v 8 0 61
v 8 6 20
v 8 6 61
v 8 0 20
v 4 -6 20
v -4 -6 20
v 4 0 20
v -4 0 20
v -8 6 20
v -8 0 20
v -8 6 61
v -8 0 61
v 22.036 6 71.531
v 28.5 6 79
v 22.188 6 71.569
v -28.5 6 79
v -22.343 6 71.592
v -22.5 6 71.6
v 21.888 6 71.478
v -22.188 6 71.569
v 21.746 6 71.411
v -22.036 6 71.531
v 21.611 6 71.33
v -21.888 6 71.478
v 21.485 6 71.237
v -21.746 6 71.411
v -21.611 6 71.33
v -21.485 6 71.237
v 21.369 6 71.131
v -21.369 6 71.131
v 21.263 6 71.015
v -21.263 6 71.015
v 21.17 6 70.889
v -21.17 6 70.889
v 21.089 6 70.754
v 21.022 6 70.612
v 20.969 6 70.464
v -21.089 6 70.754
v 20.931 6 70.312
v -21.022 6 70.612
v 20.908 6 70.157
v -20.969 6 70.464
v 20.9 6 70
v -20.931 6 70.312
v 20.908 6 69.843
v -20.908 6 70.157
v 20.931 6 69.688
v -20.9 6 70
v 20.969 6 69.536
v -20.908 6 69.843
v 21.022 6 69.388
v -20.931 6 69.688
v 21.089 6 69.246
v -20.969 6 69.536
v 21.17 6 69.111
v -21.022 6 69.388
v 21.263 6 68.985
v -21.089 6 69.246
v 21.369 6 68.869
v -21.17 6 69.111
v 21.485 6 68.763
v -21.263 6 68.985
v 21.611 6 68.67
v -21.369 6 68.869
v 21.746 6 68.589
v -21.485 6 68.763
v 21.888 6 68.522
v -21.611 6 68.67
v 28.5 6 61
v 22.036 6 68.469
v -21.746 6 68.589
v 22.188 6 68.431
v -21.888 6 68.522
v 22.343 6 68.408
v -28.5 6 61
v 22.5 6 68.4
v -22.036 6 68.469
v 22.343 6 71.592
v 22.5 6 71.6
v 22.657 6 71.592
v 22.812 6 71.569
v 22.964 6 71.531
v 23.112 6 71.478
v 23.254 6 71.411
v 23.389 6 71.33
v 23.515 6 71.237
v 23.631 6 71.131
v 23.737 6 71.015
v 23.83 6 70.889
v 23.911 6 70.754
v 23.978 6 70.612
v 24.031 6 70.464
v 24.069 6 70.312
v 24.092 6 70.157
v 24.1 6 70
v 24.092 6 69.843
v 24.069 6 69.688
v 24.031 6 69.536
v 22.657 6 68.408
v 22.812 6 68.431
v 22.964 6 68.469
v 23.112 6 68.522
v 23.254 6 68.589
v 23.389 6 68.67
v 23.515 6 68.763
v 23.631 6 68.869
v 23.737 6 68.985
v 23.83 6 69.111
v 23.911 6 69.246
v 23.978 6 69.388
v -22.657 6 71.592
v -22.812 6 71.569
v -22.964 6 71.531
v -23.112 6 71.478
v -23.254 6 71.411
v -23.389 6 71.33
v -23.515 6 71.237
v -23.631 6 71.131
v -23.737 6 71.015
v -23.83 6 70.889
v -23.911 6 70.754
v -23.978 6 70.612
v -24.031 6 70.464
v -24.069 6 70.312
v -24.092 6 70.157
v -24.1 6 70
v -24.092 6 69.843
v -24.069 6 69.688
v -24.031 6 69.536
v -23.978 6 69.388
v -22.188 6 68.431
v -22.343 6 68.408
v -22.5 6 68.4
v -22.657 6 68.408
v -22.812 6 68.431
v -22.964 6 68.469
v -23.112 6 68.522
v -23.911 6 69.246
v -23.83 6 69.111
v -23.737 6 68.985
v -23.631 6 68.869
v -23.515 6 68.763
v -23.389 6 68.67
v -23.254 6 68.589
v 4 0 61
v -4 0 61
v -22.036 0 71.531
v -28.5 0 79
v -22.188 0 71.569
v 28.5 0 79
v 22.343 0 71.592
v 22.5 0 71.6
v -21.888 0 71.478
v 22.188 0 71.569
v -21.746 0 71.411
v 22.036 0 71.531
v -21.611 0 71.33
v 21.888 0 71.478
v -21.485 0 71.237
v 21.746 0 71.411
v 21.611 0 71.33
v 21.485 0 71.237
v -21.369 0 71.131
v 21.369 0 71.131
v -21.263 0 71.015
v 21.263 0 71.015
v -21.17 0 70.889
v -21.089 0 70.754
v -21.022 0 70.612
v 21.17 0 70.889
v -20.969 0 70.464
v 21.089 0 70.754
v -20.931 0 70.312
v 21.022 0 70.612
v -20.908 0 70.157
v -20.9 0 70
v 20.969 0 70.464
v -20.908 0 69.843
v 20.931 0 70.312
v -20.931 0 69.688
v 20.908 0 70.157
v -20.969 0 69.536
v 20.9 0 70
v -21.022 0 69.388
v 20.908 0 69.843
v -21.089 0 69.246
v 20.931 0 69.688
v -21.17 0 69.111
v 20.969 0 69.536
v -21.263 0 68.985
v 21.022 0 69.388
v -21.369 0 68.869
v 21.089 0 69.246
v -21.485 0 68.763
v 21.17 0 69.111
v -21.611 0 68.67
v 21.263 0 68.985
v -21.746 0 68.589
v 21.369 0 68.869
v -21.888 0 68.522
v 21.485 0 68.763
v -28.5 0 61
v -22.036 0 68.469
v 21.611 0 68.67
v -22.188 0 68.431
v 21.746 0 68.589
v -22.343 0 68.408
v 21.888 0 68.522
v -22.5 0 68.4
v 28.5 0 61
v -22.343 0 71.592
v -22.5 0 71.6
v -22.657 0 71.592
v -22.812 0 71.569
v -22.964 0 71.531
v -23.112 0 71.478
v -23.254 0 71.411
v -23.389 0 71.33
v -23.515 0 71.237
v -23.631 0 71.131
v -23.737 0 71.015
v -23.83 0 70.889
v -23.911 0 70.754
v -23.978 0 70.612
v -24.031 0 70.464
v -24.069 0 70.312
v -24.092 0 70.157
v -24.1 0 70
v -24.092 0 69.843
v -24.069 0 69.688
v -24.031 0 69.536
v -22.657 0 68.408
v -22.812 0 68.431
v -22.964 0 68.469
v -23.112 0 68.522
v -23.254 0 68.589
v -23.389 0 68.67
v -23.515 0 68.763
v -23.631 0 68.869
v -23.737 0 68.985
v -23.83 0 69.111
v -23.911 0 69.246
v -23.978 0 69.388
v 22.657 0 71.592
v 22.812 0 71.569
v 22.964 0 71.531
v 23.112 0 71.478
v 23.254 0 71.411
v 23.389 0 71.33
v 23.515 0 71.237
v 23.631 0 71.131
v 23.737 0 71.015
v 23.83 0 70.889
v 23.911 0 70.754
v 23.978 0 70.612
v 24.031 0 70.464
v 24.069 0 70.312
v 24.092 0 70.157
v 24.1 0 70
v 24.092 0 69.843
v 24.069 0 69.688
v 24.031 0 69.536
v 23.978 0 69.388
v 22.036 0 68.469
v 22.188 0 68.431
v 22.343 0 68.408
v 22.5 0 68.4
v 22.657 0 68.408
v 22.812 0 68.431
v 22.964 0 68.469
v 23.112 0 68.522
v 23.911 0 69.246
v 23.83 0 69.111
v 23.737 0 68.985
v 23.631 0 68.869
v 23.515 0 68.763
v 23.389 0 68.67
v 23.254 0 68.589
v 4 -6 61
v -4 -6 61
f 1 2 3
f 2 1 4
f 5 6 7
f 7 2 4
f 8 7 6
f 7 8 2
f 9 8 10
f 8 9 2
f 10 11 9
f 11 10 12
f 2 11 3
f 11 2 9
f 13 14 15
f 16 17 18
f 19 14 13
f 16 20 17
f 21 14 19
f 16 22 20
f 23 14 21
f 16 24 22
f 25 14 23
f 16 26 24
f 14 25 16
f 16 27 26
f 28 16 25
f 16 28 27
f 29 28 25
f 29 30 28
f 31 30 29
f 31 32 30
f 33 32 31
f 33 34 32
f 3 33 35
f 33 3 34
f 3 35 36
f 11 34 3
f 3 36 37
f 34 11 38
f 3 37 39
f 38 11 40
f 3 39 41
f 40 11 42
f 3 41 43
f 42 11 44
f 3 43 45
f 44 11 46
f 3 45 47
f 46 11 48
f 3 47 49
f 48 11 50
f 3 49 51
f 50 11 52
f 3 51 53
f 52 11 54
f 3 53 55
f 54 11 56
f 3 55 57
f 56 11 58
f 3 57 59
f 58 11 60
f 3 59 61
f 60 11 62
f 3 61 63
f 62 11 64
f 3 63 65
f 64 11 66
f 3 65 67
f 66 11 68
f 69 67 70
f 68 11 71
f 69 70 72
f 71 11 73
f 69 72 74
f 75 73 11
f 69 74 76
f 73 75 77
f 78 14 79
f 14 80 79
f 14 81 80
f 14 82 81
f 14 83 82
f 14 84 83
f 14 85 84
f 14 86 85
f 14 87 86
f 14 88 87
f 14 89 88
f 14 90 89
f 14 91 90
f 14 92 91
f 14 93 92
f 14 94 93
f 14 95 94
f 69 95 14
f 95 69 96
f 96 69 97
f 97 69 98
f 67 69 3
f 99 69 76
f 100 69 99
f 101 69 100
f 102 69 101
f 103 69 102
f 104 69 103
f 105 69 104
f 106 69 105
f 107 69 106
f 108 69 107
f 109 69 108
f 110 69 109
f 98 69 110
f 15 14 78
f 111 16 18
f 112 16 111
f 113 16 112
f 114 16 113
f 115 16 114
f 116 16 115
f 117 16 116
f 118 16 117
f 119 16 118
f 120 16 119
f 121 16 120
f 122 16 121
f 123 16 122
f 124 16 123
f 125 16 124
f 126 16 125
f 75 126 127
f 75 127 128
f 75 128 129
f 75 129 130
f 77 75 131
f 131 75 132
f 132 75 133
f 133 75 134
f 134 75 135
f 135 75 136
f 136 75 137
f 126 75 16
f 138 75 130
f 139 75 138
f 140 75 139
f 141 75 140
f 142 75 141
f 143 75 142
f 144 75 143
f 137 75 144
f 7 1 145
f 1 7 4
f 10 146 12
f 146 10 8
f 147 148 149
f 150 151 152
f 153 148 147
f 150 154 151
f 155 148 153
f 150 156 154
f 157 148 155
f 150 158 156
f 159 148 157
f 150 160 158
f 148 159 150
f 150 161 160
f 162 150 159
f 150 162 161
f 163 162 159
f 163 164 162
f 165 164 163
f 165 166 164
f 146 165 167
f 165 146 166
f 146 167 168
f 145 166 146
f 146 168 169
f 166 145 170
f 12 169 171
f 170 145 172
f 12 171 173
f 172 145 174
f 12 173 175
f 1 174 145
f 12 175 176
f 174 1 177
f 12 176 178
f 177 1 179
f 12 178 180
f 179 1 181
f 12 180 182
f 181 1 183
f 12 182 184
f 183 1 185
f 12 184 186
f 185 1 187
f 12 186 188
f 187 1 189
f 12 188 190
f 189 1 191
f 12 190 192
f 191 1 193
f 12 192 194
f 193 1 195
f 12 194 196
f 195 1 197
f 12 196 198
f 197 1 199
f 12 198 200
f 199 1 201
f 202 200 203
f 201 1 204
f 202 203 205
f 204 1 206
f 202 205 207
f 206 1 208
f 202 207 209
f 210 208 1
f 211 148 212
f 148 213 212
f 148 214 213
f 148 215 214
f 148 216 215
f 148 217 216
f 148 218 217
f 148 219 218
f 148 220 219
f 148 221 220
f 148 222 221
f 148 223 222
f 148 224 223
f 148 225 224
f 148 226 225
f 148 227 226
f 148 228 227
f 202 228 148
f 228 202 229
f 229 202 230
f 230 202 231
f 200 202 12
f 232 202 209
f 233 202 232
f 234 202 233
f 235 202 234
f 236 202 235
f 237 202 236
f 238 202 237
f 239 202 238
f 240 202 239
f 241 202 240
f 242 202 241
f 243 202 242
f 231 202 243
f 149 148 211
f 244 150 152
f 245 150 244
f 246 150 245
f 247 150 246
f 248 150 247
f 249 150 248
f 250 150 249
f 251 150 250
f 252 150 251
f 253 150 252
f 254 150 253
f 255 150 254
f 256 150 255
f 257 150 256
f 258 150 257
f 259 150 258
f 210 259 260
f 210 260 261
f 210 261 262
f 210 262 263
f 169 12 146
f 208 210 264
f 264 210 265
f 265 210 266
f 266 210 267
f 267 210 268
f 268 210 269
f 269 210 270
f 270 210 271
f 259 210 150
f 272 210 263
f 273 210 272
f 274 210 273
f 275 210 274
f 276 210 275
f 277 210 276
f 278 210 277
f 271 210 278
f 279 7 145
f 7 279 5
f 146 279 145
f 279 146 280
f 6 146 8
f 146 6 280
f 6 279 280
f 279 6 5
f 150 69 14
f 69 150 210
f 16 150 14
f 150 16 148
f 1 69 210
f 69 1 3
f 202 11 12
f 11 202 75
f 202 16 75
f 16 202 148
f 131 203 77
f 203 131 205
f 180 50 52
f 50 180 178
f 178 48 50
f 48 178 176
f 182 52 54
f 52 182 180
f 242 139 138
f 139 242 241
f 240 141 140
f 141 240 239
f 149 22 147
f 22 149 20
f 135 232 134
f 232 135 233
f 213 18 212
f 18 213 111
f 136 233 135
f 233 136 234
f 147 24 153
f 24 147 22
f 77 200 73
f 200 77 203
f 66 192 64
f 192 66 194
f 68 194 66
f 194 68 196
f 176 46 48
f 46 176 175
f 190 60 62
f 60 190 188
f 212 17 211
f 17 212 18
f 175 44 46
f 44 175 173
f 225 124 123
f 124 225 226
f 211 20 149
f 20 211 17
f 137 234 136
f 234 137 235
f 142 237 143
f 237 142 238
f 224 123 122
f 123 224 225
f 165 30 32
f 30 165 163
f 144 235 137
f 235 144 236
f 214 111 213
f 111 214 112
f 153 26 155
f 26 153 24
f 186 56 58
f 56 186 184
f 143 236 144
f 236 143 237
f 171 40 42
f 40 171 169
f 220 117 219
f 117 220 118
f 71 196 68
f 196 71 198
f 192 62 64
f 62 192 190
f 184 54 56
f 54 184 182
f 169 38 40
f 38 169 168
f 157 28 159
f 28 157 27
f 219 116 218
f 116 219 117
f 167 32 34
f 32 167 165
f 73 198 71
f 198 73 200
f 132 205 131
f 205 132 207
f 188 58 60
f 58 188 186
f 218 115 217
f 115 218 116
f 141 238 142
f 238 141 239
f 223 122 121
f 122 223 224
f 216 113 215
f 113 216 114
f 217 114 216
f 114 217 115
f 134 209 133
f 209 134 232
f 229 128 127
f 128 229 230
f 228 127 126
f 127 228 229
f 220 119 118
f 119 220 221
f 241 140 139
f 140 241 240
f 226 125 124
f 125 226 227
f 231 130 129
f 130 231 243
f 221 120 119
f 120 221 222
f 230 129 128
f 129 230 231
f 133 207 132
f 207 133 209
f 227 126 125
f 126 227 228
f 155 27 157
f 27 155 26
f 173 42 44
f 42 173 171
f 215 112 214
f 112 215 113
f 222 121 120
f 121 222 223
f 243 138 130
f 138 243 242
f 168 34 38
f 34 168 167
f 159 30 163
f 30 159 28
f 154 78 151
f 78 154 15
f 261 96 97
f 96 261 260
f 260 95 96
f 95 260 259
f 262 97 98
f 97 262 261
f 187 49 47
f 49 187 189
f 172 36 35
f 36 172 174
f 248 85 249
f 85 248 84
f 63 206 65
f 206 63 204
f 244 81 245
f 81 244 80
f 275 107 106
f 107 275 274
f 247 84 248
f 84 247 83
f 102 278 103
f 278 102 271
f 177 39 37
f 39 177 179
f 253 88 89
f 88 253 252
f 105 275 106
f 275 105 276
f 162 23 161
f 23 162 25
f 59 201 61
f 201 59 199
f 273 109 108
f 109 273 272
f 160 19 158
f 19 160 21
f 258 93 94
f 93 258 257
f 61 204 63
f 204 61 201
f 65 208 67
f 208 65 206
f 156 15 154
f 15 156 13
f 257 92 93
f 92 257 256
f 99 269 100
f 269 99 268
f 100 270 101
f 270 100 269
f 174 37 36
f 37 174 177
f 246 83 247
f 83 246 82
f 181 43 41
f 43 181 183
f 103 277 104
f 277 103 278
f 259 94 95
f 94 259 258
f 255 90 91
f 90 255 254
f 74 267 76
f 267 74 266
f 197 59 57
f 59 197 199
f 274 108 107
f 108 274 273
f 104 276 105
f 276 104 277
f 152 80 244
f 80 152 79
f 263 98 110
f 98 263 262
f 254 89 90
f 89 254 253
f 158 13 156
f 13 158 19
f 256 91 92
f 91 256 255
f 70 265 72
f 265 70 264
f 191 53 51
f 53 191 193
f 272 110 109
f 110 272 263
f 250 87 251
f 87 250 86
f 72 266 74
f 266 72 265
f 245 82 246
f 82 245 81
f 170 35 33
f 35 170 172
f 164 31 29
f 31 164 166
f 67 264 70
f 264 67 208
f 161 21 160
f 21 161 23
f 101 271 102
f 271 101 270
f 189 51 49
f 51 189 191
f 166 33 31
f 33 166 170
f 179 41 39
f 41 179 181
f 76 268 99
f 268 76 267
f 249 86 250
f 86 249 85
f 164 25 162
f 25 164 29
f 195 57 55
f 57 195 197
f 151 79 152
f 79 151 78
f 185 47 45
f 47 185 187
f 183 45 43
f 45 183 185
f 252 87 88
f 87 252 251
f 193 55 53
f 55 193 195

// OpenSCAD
// DRAFT ONLY: additive extension; fuse root with existing trowel holder.
// Coordinate: X along handle, Y outward from flange, Z sideways.
// D435 rear M3, 45 mm centers, max screw insertion 3 mm.
// Not a complete flange/clamp CAD. Validate actual D435f and cable clearance.
$fn=64;
z=70.0; t=6.0; pitch=45.0; bore=3.2;
difference() {
 union() {
  translate([-8,0,20]) cube([16,t,z-20]);
  translate([-4,-6,20]) cube([8,6,z-29]);
  translate([-pitch/2-6,0,z-9]) cube([pitch+12,t,18]);
 }
 for(x=[-pitch/2,pitch/2])
  translate([x,-1,z]) rotate([-90,0,0]) cylinder(h=t+2,d=bore);
}
